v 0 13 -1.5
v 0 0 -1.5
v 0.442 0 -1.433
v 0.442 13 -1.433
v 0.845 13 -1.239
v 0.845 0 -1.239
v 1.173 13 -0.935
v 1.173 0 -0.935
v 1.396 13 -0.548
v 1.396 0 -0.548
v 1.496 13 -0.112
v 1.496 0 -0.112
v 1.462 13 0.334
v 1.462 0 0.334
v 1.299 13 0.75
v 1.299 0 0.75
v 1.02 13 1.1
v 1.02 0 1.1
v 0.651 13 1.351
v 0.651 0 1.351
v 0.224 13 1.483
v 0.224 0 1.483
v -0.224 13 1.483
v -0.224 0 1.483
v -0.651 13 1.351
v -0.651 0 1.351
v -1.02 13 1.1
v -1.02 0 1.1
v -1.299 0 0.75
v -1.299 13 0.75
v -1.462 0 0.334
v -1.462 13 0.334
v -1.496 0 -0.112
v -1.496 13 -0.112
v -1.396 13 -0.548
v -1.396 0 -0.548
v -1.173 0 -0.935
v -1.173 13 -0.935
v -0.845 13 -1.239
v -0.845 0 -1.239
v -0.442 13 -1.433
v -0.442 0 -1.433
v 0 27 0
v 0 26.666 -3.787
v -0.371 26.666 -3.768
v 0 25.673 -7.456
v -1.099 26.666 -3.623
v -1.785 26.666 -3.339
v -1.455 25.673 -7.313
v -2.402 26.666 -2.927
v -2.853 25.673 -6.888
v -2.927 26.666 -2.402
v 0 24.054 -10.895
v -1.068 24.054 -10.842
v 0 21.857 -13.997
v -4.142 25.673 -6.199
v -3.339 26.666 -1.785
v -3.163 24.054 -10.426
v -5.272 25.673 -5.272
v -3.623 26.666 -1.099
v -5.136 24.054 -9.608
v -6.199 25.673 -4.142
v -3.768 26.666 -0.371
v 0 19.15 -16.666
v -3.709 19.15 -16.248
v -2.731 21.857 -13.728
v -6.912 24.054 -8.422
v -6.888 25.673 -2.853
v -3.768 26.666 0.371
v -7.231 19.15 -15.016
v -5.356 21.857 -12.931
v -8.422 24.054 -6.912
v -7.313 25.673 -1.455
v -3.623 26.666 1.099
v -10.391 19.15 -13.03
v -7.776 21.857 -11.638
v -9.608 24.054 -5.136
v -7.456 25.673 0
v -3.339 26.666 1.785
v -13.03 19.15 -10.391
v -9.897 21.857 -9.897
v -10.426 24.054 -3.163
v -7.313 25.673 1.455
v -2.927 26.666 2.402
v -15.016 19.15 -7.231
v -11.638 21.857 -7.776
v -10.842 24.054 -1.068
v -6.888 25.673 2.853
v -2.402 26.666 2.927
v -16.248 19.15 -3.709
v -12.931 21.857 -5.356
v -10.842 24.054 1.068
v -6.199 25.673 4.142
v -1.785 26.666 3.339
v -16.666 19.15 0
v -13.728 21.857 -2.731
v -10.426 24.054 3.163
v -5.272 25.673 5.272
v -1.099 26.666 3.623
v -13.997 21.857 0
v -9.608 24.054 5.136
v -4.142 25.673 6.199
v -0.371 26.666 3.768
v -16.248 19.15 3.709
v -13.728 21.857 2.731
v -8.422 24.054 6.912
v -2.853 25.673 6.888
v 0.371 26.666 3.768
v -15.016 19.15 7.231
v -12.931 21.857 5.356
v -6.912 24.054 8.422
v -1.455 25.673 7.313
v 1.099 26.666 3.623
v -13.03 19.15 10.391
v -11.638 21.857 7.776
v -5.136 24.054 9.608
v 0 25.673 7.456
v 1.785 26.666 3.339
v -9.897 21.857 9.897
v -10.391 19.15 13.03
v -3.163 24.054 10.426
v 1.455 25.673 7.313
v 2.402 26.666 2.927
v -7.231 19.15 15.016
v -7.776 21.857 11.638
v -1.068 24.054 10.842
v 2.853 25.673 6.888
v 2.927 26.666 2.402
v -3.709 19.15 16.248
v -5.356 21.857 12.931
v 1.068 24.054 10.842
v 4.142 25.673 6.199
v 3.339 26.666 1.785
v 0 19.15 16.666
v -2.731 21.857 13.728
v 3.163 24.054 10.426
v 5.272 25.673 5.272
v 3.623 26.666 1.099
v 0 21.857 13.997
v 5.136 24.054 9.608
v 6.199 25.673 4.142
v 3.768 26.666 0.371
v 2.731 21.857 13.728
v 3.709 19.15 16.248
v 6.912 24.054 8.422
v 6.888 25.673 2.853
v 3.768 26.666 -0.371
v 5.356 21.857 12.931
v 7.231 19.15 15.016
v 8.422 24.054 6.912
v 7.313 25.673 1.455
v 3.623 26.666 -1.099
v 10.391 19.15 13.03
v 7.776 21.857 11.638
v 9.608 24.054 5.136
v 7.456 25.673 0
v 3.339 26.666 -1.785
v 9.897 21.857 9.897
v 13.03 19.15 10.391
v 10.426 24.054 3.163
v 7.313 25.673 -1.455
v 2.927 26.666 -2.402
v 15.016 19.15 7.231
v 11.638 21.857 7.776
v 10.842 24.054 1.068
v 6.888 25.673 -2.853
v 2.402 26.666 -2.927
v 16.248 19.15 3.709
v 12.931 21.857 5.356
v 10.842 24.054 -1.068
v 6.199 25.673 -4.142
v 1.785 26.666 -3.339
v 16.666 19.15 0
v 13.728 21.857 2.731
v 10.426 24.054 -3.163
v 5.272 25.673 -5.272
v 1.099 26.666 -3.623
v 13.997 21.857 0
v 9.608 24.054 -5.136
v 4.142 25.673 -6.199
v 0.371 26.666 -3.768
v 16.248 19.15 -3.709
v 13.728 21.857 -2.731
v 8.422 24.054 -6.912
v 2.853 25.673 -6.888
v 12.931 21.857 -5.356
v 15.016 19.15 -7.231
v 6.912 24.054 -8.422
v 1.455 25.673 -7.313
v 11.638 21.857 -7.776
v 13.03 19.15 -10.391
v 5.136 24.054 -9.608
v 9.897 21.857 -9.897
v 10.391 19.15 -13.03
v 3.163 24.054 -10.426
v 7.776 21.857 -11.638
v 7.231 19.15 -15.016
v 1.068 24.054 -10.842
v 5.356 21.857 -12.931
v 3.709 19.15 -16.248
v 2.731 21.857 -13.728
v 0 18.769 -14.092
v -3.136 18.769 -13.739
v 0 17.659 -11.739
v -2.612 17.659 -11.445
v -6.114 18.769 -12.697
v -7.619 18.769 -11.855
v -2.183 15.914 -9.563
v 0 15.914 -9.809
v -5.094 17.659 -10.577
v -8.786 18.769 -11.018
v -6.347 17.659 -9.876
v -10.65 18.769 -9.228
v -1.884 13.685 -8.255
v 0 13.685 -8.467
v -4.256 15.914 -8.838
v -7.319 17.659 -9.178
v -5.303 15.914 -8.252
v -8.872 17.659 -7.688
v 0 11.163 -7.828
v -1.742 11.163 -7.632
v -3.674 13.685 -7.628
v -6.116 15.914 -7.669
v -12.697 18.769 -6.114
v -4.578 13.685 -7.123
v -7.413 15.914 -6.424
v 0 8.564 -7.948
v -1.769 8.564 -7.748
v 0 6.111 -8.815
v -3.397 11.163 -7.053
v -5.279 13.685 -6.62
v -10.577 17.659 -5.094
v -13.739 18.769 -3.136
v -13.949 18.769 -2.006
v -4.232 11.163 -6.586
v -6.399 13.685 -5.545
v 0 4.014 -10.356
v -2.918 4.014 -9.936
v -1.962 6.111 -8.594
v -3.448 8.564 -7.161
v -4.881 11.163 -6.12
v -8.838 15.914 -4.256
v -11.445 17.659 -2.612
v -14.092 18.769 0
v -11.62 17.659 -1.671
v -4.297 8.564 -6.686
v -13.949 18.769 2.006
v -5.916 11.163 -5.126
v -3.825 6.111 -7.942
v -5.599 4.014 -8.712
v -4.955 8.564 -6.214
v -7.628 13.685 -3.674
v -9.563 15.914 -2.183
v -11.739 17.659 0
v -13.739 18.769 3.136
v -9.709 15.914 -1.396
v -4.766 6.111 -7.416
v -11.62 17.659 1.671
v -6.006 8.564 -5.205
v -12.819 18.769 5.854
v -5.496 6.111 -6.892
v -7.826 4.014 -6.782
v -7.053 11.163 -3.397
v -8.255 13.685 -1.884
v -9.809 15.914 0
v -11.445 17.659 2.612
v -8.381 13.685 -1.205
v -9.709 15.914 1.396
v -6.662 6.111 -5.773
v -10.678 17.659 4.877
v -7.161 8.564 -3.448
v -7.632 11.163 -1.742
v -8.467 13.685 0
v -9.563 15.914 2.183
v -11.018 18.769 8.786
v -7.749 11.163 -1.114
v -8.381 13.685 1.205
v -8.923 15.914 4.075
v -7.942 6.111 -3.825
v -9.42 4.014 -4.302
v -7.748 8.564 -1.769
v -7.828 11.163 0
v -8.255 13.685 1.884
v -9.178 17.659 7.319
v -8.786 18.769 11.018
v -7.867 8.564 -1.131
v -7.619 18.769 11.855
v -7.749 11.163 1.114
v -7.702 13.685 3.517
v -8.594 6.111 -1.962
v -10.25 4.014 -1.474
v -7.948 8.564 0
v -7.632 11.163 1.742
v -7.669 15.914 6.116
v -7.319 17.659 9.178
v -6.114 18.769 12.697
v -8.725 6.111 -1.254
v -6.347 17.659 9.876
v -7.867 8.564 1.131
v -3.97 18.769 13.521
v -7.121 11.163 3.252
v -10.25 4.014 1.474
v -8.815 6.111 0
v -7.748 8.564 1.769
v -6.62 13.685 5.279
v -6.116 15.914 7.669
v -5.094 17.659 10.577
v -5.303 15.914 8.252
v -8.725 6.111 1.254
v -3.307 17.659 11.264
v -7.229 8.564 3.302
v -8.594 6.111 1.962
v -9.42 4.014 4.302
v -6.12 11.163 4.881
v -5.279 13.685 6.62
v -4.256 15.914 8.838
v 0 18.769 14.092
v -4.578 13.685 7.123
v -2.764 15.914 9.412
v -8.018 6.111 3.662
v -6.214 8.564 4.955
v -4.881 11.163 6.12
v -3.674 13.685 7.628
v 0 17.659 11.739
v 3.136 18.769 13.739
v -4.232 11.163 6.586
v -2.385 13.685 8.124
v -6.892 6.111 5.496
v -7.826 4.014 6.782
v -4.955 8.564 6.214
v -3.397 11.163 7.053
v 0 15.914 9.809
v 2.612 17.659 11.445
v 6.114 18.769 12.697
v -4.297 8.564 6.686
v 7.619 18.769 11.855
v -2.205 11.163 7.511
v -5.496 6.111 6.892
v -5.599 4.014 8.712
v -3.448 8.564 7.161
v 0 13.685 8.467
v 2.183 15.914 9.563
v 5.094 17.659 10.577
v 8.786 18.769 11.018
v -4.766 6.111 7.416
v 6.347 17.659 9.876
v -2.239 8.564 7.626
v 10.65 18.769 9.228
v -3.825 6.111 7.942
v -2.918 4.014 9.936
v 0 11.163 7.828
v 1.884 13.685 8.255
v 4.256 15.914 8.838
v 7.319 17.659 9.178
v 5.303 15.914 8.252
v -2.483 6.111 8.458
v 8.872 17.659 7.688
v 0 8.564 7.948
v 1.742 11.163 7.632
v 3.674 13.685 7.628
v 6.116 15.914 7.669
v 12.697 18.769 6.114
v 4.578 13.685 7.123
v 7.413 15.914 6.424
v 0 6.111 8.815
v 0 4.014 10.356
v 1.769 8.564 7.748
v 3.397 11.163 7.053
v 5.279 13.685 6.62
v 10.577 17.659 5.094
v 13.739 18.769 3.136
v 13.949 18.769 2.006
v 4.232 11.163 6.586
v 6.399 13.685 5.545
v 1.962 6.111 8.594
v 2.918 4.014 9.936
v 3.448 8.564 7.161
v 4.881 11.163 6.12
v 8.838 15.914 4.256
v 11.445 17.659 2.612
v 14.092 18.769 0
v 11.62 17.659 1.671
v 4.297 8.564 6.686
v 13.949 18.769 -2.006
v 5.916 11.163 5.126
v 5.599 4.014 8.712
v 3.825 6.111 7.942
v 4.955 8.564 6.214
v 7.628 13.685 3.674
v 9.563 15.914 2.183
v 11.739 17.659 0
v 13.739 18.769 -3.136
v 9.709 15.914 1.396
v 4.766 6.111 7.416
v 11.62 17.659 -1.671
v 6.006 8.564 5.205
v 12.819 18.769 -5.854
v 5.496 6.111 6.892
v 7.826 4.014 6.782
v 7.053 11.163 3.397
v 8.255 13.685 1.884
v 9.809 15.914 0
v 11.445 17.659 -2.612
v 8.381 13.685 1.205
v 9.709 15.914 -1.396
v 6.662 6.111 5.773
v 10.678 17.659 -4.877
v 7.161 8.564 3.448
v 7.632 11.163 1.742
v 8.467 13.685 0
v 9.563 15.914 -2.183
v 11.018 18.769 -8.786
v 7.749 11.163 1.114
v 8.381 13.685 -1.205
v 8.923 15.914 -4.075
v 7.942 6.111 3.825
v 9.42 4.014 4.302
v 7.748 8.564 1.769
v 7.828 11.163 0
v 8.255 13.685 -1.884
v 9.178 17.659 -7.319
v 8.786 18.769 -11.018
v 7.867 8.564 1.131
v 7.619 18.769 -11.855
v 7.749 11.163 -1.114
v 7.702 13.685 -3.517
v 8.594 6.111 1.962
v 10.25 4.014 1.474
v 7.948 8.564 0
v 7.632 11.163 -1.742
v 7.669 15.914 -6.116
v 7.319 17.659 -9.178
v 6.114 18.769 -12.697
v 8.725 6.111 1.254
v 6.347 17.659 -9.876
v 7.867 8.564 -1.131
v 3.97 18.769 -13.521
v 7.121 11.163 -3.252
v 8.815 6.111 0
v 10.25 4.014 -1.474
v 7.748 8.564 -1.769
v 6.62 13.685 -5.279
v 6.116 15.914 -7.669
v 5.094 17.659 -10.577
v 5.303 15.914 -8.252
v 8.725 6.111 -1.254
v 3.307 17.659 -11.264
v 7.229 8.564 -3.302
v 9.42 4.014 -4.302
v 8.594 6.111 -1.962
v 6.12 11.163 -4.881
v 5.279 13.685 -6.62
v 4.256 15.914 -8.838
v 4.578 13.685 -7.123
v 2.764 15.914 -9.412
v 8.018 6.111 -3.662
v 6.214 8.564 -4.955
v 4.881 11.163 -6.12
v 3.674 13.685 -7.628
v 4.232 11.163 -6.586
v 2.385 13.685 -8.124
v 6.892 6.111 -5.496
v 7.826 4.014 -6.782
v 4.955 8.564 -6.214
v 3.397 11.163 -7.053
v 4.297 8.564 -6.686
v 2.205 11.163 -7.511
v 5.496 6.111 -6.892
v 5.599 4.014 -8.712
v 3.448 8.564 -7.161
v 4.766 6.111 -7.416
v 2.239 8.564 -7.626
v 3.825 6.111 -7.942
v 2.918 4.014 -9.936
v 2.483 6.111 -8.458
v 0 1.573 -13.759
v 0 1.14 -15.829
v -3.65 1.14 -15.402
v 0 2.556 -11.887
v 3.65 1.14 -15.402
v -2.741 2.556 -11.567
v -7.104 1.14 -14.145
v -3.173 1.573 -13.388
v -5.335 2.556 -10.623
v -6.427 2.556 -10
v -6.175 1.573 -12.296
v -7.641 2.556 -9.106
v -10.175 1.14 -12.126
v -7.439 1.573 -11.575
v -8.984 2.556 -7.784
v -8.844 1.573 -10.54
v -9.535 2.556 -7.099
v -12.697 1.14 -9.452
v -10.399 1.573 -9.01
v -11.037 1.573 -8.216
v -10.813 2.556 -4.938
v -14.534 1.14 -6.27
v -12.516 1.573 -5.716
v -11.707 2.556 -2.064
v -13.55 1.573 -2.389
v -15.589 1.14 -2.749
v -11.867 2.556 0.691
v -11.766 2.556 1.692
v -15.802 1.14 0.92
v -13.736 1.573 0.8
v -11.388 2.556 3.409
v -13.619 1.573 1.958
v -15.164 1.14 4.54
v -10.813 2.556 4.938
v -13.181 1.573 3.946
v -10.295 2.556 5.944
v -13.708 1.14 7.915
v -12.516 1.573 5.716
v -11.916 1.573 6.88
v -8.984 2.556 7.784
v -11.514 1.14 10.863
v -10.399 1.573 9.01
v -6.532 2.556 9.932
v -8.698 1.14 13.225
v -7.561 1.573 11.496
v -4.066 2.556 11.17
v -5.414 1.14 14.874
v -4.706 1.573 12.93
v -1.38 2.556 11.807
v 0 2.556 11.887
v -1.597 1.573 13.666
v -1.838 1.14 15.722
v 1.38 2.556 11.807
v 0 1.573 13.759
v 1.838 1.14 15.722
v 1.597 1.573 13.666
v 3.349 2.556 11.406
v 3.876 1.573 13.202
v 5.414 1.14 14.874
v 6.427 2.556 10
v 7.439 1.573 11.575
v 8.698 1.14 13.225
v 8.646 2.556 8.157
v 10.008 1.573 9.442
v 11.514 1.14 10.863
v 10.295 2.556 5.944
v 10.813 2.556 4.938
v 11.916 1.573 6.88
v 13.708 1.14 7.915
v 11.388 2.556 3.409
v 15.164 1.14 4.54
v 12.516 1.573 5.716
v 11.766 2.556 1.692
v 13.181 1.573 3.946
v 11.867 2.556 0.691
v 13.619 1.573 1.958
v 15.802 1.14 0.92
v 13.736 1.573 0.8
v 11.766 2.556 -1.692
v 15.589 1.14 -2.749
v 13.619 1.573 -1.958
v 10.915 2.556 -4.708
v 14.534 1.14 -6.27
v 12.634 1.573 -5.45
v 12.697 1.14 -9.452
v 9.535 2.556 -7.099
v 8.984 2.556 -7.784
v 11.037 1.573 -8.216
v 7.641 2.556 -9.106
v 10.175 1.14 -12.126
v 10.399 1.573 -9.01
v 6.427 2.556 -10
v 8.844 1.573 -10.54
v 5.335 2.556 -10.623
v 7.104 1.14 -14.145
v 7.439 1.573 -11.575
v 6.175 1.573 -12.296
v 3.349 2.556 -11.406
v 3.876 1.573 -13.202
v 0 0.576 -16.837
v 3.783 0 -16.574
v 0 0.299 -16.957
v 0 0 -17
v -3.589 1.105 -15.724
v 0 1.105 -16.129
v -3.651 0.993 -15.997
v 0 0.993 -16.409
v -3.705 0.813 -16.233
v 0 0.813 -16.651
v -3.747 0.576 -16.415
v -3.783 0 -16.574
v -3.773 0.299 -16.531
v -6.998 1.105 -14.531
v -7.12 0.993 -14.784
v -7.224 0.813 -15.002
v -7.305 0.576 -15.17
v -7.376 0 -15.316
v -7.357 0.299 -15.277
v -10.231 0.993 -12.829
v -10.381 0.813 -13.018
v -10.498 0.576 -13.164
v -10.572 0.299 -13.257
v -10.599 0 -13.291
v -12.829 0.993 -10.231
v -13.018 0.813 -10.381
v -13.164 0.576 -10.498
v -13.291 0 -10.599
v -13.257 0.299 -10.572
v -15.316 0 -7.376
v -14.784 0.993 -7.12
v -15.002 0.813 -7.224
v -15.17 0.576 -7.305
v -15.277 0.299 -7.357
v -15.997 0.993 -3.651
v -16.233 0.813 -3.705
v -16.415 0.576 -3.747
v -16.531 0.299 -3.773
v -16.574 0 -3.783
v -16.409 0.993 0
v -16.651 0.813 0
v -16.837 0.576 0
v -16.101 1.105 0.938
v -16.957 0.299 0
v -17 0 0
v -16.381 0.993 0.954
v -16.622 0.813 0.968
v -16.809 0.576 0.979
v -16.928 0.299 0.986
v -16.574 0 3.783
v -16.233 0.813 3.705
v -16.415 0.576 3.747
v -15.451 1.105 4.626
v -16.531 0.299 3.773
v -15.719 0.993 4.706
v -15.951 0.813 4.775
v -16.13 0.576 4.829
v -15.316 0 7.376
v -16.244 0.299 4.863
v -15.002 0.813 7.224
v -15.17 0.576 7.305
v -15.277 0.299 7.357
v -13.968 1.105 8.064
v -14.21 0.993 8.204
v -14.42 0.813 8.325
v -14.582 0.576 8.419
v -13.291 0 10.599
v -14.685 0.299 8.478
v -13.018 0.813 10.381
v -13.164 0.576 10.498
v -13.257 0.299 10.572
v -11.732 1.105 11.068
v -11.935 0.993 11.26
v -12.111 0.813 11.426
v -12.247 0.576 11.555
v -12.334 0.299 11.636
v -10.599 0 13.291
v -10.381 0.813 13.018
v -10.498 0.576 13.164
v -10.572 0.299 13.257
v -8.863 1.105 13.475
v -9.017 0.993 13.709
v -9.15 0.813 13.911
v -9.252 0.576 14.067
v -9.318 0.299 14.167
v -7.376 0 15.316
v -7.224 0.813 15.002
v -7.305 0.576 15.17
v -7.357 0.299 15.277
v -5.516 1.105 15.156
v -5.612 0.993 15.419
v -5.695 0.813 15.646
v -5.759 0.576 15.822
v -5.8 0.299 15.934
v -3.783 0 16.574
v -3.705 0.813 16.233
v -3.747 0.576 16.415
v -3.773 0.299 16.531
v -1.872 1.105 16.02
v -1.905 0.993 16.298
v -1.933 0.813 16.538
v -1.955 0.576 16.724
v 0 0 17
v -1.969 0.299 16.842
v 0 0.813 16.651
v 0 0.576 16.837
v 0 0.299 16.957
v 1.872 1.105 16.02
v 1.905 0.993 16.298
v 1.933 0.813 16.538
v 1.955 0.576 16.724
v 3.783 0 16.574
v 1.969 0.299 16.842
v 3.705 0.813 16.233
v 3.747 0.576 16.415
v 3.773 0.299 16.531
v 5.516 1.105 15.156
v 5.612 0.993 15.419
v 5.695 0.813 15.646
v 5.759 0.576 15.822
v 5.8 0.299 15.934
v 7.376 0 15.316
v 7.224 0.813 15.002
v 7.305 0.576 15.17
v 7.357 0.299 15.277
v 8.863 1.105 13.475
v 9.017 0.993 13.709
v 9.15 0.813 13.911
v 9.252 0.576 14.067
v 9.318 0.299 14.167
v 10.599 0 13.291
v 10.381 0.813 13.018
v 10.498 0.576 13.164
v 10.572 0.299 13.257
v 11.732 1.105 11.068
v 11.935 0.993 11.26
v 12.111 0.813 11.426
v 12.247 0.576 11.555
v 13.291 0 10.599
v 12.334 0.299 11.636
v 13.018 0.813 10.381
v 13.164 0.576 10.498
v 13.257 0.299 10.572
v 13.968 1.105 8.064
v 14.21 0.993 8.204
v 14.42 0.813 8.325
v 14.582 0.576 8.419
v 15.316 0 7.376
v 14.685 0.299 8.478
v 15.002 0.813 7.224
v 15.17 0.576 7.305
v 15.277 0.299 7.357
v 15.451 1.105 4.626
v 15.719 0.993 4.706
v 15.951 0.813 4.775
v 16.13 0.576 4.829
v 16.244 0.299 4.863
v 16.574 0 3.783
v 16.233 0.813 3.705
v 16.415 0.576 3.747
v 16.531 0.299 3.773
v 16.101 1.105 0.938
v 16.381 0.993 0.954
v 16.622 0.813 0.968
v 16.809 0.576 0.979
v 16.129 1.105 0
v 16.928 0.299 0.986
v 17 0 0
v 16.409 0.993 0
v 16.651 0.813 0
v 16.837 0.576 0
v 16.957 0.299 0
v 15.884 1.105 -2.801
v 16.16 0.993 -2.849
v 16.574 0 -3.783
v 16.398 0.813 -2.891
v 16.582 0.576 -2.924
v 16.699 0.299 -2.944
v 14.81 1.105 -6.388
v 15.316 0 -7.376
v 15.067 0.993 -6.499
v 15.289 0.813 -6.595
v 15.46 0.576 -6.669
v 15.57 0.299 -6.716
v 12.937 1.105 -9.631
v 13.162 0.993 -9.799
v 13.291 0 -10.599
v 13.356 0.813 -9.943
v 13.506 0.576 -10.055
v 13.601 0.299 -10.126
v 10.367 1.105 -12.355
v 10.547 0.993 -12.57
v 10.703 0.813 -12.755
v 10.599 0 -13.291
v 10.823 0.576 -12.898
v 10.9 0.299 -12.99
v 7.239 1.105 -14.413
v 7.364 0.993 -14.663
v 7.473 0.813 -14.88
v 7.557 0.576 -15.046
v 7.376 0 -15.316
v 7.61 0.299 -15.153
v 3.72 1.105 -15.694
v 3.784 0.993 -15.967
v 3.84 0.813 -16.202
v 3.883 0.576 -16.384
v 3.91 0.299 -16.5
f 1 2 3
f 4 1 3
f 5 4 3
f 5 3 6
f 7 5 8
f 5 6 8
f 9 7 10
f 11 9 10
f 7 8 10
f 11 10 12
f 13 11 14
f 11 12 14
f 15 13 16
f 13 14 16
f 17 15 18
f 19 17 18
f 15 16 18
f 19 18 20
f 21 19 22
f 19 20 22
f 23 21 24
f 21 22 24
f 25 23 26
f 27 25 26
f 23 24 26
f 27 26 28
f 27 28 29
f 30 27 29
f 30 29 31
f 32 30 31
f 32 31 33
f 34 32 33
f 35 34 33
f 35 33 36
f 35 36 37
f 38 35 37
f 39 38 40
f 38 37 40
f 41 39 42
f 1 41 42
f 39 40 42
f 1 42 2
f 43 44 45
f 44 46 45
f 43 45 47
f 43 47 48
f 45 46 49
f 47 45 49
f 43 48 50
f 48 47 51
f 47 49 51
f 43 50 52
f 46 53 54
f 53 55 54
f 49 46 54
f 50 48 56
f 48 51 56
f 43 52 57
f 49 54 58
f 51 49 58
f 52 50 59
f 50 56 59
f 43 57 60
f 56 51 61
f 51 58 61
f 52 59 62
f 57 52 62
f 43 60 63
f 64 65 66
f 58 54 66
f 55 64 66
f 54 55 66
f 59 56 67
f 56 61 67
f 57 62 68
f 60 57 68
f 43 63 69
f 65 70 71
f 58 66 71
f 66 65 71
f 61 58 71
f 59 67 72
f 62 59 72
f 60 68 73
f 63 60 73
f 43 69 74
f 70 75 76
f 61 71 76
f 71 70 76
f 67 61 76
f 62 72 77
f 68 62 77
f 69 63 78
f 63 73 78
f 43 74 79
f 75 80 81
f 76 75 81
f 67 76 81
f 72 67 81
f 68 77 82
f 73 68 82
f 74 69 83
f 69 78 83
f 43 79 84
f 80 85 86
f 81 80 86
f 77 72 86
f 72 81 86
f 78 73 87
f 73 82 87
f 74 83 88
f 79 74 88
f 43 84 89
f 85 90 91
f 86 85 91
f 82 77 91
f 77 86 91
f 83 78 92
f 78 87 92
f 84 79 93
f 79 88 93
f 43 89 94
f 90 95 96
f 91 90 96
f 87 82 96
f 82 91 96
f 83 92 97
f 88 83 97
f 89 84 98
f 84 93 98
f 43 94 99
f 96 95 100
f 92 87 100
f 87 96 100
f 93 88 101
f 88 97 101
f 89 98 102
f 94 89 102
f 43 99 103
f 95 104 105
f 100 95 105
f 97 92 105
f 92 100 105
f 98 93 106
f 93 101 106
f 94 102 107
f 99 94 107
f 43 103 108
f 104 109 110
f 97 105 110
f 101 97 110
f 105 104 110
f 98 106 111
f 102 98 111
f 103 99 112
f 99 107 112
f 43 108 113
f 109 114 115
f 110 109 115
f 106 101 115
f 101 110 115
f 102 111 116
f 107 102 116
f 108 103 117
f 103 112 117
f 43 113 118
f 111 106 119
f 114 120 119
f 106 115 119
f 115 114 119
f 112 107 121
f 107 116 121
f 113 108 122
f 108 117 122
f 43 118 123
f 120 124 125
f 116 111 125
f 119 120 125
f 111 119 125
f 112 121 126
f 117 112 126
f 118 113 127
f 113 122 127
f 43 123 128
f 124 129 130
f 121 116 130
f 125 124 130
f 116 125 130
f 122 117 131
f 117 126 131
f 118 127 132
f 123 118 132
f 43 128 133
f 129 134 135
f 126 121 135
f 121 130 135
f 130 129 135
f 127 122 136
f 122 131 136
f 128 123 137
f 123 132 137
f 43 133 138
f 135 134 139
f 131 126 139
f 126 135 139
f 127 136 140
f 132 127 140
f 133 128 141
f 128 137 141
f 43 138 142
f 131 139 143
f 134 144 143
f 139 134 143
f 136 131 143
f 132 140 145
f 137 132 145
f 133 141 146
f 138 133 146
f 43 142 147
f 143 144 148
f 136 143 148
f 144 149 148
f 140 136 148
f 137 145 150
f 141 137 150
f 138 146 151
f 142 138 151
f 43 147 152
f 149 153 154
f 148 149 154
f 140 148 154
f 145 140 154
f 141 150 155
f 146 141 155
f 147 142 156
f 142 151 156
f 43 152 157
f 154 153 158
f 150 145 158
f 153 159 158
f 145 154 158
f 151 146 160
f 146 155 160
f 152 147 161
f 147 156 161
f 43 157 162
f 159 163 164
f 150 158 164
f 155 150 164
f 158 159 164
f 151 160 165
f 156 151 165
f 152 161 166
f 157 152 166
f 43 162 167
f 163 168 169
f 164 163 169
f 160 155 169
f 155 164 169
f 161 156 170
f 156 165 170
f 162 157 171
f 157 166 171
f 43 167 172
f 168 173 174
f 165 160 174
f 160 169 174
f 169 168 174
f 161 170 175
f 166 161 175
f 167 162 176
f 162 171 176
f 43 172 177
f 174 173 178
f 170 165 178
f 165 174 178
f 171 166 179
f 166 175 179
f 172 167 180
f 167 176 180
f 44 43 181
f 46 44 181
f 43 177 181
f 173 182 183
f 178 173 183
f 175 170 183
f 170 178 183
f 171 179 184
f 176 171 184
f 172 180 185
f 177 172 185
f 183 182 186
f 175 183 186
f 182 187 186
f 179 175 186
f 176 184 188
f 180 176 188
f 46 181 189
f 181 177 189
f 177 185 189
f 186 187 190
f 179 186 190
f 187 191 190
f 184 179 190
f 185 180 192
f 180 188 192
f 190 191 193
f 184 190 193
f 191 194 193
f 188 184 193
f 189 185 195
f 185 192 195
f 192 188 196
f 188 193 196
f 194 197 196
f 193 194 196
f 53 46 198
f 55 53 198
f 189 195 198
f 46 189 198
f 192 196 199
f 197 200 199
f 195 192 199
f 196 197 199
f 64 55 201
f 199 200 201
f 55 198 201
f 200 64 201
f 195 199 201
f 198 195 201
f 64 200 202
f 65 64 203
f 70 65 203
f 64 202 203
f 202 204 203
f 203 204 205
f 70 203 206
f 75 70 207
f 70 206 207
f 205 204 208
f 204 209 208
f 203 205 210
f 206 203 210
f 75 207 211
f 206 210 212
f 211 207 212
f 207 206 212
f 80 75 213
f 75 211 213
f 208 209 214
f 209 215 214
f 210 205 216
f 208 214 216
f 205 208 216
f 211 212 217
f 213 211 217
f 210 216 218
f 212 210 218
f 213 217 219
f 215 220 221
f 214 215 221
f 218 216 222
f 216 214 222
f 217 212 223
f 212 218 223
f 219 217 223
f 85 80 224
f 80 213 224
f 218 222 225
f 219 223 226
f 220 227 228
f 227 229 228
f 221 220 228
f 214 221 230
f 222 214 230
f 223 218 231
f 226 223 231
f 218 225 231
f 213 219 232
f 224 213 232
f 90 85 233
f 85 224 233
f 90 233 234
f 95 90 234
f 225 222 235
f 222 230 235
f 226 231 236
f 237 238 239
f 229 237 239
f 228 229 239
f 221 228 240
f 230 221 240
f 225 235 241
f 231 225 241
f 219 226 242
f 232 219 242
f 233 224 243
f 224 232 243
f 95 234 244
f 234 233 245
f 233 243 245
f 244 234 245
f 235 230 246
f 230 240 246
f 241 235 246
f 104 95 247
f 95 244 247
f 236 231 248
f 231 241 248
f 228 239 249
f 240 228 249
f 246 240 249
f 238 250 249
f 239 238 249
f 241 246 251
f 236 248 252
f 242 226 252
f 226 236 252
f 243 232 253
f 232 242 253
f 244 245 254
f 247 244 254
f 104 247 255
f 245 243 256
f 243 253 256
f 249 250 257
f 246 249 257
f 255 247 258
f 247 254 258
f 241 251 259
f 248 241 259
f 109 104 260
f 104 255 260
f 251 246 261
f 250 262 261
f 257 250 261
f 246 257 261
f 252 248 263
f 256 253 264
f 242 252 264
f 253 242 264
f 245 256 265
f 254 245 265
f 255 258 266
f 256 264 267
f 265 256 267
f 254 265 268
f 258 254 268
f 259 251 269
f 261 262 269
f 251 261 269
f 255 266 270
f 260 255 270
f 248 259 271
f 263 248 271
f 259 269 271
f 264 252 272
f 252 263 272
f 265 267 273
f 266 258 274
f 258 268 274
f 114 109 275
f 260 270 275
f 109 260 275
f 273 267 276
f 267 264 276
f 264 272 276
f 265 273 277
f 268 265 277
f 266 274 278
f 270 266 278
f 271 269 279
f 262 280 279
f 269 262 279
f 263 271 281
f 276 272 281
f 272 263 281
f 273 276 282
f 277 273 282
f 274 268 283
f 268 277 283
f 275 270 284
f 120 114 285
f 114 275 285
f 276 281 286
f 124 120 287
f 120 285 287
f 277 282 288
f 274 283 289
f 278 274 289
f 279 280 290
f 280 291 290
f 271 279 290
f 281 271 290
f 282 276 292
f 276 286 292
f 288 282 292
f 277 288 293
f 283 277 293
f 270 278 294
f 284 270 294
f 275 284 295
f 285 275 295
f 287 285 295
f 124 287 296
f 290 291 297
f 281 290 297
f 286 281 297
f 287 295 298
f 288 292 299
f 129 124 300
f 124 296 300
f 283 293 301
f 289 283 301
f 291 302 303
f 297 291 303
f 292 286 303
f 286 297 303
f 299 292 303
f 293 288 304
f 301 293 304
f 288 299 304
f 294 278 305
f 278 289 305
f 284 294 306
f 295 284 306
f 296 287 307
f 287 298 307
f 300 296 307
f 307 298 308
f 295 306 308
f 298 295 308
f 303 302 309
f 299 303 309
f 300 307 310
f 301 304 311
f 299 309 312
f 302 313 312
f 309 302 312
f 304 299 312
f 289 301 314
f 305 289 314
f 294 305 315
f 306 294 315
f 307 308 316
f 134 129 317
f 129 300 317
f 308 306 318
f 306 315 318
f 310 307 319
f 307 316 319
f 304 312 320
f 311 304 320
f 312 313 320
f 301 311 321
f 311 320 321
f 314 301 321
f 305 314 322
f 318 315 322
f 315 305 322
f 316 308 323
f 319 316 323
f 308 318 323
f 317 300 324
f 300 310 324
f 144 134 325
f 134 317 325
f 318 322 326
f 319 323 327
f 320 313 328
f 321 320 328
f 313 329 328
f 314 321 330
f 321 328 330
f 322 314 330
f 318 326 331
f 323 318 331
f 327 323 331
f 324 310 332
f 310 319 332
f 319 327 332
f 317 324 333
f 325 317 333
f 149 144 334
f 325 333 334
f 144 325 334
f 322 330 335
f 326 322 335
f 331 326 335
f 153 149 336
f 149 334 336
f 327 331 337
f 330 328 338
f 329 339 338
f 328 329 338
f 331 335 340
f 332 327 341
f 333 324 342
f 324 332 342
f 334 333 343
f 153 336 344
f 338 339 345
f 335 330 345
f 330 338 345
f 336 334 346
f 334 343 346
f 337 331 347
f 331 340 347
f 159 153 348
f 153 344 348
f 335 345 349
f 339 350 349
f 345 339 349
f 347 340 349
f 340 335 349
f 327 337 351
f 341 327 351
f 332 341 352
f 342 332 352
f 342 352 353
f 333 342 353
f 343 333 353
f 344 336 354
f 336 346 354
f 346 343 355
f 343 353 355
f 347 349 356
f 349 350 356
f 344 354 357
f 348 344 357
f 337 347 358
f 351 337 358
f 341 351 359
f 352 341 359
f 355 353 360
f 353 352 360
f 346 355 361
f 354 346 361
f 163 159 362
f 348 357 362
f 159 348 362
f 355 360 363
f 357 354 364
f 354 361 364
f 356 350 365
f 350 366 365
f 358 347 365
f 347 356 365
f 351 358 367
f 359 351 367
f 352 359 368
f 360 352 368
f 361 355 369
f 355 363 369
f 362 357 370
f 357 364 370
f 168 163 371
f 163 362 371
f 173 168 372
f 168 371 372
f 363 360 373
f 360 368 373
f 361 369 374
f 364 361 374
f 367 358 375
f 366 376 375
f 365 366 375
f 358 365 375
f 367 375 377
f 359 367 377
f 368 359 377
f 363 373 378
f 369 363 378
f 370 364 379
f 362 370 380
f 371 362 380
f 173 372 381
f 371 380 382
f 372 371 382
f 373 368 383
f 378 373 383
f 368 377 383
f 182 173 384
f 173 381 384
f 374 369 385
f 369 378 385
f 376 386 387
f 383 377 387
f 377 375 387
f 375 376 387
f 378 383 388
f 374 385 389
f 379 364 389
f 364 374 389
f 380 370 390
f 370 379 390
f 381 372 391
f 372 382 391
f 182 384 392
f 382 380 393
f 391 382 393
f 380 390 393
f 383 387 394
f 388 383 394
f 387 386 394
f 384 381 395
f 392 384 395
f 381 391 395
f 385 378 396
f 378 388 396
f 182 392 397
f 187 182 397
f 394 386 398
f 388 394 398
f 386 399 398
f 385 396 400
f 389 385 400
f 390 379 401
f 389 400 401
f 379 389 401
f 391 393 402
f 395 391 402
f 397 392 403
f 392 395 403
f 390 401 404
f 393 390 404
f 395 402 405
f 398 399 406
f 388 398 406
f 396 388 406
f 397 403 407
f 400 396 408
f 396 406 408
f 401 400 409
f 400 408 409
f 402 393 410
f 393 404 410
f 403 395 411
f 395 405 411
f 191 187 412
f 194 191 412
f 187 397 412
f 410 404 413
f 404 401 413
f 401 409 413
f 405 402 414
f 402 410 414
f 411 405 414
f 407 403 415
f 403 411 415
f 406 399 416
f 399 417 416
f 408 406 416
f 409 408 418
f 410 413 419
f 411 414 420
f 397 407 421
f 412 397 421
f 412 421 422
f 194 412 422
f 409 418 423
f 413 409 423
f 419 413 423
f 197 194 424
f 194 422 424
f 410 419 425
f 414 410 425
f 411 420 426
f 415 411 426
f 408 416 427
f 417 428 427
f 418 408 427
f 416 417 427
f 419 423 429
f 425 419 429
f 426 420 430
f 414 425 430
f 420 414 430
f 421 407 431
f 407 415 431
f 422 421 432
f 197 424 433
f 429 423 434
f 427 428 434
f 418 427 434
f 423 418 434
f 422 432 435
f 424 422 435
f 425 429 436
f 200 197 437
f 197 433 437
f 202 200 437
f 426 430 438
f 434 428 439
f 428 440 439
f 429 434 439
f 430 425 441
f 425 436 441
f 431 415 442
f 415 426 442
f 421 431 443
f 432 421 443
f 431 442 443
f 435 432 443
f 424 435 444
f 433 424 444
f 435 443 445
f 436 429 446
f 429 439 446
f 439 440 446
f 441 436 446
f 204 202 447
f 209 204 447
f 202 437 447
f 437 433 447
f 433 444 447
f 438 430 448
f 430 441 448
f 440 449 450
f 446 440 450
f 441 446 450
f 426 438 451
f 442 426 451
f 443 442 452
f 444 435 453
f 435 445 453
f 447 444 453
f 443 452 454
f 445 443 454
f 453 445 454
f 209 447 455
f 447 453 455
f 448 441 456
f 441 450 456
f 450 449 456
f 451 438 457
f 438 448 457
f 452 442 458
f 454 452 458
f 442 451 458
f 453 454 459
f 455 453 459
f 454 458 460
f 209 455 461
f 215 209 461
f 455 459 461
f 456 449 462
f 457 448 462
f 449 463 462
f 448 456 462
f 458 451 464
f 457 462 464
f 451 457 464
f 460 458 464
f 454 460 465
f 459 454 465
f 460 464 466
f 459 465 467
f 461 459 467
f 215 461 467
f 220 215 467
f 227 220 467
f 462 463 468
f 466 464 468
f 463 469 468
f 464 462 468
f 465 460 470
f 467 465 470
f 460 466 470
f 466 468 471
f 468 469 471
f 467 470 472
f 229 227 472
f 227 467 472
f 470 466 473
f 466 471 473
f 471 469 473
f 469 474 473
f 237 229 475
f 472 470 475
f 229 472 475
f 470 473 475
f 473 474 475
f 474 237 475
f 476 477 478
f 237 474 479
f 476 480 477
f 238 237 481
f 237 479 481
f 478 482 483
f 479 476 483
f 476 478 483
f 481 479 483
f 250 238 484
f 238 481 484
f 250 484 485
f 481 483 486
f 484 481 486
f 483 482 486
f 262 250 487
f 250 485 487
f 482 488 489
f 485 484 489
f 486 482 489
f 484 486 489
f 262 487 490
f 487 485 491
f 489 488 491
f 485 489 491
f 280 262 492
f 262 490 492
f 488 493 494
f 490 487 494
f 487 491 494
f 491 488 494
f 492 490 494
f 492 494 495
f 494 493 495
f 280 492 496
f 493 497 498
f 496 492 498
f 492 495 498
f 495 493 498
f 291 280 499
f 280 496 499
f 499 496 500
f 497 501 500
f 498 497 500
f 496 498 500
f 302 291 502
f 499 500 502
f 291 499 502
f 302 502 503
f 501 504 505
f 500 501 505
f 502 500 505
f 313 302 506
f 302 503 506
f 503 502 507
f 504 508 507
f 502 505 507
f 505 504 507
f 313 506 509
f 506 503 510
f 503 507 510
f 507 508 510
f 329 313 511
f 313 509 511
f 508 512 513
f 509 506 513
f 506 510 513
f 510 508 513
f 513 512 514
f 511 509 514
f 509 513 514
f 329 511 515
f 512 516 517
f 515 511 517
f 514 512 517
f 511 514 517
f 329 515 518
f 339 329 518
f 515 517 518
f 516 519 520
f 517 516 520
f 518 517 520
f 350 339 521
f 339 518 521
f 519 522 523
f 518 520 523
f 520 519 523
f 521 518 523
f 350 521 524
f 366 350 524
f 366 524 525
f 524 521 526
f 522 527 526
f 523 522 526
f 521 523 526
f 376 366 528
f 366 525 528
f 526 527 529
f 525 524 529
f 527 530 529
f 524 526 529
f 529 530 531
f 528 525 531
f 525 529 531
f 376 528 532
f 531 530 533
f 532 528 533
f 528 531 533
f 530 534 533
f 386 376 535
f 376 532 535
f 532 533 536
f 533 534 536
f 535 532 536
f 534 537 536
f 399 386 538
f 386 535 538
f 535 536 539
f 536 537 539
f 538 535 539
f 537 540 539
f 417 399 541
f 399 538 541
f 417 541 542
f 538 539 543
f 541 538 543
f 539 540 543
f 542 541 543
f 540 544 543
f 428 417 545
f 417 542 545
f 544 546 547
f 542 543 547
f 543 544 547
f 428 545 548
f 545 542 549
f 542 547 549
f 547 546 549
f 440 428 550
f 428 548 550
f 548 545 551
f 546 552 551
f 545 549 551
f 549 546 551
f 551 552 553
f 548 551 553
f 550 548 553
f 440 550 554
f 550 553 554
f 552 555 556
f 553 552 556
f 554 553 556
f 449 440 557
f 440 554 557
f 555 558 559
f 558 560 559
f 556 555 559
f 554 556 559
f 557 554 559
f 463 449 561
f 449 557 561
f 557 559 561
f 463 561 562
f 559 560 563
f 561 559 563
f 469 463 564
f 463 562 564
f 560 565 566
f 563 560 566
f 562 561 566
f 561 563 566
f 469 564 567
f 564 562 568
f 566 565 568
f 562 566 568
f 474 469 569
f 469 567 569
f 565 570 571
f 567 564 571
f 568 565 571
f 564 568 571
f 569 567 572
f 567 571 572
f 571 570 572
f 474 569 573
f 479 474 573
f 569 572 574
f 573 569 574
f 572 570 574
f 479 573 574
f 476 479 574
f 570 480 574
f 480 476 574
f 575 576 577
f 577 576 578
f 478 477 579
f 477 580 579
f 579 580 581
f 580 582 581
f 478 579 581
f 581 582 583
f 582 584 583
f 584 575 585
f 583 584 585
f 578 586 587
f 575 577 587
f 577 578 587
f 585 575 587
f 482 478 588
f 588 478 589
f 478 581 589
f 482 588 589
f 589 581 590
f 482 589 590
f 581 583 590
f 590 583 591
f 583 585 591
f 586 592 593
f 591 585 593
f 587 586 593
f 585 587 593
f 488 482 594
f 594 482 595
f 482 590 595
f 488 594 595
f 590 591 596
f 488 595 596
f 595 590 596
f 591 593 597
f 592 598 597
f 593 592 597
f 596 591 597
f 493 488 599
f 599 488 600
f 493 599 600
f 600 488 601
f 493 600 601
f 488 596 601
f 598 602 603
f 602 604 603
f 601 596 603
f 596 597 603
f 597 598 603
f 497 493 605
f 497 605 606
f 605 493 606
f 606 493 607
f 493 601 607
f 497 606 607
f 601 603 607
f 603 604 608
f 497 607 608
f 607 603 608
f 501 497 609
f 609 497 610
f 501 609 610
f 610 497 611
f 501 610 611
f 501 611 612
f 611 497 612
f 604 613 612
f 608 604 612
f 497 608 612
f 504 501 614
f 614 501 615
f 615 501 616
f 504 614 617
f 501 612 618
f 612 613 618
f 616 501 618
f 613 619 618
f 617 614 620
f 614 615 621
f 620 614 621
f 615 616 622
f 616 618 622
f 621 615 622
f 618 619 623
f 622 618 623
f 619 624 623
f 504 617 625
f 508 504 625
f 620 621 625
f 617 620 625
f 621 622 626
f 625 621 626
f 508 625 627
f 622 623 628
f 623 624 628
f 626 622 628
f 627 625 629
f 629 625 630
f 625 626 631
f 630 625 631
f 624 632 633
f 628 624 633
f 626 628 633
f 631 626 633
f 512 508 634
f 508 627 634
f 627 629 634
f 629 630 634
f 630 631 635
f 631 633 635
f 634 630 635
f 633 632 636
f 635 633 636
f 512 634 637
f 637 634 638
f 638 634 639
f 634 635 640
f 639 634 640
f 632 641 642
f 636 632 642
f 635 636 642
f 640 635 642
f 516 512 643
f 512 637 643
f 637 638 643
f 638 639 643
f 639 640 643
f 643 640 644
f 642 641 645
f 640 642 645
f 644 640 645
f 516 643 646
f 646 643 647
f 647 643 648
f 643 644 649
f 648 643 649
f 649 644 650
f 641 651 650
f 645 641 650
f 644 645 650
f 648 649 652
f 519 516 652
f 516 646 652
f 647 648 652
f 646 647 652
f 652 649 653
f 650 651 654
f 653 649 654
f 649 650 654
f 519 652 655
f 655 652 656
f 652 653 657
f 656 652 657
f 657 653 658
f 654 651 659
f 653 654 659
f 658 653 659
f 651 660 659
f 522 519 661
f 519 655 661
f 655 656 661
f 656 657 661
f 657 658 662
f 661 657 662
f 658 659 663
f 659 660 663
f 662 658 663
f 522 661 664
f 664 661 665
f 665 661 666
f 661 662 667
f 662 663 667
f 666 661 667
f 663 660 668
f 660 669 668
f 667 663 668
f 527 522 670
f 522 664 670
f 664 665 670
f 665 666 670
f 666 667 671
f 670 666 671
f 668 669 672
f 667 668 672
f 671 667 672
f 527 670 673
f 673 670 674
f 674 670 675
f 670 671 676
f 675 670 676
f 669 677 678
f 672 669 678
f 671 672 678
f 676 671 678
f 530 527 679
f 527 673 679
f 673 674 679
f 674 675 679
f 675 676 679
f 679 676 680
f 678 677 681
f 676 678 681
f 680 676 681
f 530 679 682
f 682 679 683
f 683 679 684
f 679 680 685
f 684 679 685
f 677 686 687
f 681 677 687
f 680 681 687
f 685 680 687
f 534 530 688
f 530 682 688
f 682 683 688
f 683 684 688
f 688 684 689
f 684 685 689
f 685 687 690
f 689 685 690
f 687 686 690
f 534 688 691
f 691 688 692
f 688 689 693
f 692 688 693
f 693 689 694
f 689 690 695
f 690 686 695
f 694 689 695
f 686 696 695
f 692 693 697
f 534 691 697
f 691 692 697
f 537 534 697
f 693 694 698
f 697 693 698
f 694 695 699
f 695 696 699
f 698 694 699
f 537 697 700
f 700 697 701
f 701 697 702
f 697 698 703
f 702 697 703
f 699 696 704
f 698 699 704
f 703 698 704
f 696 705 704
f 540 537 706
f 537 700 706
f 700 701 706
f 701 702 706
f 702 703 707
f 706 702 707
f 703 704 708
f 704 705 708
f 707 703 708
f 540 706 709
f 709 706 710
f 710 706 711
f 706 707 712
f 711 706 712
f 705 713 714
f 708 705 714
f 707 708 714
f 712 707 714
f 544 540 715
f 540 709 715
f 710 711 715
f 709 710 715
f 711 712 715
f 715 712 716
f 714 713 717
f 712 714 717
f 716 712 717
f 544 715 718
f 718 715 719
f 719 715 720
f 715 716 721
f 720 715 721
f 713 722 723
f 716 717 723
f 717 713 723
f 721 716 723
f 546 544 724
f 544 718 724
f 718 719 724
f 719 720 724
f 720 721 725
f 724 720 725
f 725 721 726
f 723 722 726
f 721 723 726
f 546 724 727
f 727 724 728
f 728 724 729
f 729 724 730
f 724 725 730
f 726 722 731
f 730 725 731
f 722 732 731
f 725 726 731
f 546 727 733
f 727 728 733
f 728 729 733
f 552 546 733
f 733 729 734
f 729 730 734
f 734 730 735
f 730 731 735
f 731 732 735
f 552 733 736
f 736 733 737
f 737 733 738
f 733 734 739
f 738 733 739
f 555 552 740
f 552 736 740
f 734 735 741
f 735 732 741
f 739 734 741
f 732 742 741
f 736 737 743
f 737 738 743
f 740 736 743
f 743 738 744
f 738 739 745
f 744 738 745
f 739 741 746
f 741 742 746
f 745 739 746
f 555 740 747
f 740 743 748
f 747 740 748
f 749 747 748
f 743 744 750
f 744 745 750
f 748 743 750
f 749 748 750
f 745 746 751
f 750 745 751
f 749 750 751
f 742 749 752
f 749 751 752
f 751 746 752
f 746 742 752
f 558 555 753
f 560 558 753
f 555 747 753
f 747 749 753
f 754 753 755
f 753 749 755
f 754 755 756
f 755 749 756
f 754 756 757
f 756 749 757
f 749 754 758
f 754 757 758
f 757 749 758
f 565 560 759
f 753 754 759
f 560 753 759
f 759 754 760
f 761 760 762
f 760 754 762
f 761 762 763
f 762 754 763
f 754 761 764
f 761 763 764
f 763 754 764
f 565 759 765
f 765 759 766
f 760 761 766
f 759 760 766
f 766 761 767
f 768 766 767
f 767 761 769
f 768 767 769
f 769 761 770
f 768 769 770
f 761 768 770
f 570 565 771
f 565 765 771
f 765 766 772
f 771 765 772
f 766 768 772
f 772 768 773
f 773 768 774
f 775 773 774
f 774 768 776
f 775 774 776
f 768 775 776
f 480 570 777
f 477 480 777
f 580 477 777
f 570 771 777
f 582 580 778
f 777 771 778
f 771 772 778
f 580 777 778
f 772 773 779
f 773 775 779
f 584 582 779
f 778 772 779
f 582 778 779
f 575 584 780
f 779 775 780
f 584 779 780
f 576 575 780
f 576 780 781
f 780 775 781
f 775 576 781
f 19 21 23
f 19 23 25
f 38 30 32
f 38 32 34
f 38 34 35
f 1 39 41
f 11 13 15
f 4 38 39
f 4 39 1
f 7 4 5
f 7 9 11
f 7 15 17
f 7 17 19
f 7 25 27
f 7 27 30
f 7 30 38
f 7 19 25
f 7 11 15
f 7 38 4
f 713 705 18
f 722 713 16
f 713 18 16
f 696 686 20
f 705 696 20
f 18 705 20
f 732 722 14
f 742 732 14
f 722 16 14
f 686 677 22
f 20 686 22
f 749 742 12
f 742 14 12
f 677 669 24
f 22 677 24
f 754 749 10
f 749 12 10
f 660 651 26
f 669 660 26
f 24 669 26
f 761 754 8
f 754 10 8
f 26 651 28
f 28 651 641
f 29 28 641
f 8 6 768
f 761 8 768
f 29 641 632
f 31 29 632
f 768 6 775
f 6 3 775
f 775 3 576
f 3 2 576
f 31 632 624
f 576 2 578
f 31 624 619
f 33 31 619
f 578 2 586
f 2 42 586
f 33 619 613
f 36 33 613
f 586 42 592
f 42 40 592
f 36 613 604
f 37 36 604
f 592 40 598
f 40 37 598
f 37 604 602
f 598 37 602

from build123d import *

# Parameters (mm, degrees)
SKETCH3_R          = 1.5
CUT_EXTRUDE2_DEPTH = 13


with BuildPart() as part:
    # Sketch1 → Revolve1 (revolve)
    with BuildSketch(Plane.XY, mode=Mode.PRIVATE) as revolve1_sk:
        with BuildLine():
            Line((0, 0), (0, 27))
            ThreePointArc((0, 27), (9.211074802, 24.939349426), (16.666049883, 19.150262594))
            ThreePointArc((16.666049883, 19.150262594), (8.466959251, 13.685208076), (10.355749103, 4.014407645))
            ThreePointArc((10.355749103, 4.014407645), (12.789115338, 1.999736062), (15.829018223, 1.139990011))
            ThreePointArc((15.829018223, 1.139990011), (16.650608773, 0.812513272), (17, 0))
            Line((17, 0), (0, 0))
        make_face()
    revolve(revolve1_sk.sketch.rotate(Axis((0, 0, 0), (0, 1, 0)), 90), axis=Axis((0, 0, 0), (0, 1, 0)))

    # Sketch3 → Cut-Extrude2 (cut)
    with BuildSketch(Plane.XZ):
        with Locations(Location((0, 0, 0), (0, 0, 270))):
            Circle(SKETCH3_R)
    extrude(amount=-CUT_EXTRUDE2_DEPTH, mode=Mode.SUBTRACT)


solid = part.part
